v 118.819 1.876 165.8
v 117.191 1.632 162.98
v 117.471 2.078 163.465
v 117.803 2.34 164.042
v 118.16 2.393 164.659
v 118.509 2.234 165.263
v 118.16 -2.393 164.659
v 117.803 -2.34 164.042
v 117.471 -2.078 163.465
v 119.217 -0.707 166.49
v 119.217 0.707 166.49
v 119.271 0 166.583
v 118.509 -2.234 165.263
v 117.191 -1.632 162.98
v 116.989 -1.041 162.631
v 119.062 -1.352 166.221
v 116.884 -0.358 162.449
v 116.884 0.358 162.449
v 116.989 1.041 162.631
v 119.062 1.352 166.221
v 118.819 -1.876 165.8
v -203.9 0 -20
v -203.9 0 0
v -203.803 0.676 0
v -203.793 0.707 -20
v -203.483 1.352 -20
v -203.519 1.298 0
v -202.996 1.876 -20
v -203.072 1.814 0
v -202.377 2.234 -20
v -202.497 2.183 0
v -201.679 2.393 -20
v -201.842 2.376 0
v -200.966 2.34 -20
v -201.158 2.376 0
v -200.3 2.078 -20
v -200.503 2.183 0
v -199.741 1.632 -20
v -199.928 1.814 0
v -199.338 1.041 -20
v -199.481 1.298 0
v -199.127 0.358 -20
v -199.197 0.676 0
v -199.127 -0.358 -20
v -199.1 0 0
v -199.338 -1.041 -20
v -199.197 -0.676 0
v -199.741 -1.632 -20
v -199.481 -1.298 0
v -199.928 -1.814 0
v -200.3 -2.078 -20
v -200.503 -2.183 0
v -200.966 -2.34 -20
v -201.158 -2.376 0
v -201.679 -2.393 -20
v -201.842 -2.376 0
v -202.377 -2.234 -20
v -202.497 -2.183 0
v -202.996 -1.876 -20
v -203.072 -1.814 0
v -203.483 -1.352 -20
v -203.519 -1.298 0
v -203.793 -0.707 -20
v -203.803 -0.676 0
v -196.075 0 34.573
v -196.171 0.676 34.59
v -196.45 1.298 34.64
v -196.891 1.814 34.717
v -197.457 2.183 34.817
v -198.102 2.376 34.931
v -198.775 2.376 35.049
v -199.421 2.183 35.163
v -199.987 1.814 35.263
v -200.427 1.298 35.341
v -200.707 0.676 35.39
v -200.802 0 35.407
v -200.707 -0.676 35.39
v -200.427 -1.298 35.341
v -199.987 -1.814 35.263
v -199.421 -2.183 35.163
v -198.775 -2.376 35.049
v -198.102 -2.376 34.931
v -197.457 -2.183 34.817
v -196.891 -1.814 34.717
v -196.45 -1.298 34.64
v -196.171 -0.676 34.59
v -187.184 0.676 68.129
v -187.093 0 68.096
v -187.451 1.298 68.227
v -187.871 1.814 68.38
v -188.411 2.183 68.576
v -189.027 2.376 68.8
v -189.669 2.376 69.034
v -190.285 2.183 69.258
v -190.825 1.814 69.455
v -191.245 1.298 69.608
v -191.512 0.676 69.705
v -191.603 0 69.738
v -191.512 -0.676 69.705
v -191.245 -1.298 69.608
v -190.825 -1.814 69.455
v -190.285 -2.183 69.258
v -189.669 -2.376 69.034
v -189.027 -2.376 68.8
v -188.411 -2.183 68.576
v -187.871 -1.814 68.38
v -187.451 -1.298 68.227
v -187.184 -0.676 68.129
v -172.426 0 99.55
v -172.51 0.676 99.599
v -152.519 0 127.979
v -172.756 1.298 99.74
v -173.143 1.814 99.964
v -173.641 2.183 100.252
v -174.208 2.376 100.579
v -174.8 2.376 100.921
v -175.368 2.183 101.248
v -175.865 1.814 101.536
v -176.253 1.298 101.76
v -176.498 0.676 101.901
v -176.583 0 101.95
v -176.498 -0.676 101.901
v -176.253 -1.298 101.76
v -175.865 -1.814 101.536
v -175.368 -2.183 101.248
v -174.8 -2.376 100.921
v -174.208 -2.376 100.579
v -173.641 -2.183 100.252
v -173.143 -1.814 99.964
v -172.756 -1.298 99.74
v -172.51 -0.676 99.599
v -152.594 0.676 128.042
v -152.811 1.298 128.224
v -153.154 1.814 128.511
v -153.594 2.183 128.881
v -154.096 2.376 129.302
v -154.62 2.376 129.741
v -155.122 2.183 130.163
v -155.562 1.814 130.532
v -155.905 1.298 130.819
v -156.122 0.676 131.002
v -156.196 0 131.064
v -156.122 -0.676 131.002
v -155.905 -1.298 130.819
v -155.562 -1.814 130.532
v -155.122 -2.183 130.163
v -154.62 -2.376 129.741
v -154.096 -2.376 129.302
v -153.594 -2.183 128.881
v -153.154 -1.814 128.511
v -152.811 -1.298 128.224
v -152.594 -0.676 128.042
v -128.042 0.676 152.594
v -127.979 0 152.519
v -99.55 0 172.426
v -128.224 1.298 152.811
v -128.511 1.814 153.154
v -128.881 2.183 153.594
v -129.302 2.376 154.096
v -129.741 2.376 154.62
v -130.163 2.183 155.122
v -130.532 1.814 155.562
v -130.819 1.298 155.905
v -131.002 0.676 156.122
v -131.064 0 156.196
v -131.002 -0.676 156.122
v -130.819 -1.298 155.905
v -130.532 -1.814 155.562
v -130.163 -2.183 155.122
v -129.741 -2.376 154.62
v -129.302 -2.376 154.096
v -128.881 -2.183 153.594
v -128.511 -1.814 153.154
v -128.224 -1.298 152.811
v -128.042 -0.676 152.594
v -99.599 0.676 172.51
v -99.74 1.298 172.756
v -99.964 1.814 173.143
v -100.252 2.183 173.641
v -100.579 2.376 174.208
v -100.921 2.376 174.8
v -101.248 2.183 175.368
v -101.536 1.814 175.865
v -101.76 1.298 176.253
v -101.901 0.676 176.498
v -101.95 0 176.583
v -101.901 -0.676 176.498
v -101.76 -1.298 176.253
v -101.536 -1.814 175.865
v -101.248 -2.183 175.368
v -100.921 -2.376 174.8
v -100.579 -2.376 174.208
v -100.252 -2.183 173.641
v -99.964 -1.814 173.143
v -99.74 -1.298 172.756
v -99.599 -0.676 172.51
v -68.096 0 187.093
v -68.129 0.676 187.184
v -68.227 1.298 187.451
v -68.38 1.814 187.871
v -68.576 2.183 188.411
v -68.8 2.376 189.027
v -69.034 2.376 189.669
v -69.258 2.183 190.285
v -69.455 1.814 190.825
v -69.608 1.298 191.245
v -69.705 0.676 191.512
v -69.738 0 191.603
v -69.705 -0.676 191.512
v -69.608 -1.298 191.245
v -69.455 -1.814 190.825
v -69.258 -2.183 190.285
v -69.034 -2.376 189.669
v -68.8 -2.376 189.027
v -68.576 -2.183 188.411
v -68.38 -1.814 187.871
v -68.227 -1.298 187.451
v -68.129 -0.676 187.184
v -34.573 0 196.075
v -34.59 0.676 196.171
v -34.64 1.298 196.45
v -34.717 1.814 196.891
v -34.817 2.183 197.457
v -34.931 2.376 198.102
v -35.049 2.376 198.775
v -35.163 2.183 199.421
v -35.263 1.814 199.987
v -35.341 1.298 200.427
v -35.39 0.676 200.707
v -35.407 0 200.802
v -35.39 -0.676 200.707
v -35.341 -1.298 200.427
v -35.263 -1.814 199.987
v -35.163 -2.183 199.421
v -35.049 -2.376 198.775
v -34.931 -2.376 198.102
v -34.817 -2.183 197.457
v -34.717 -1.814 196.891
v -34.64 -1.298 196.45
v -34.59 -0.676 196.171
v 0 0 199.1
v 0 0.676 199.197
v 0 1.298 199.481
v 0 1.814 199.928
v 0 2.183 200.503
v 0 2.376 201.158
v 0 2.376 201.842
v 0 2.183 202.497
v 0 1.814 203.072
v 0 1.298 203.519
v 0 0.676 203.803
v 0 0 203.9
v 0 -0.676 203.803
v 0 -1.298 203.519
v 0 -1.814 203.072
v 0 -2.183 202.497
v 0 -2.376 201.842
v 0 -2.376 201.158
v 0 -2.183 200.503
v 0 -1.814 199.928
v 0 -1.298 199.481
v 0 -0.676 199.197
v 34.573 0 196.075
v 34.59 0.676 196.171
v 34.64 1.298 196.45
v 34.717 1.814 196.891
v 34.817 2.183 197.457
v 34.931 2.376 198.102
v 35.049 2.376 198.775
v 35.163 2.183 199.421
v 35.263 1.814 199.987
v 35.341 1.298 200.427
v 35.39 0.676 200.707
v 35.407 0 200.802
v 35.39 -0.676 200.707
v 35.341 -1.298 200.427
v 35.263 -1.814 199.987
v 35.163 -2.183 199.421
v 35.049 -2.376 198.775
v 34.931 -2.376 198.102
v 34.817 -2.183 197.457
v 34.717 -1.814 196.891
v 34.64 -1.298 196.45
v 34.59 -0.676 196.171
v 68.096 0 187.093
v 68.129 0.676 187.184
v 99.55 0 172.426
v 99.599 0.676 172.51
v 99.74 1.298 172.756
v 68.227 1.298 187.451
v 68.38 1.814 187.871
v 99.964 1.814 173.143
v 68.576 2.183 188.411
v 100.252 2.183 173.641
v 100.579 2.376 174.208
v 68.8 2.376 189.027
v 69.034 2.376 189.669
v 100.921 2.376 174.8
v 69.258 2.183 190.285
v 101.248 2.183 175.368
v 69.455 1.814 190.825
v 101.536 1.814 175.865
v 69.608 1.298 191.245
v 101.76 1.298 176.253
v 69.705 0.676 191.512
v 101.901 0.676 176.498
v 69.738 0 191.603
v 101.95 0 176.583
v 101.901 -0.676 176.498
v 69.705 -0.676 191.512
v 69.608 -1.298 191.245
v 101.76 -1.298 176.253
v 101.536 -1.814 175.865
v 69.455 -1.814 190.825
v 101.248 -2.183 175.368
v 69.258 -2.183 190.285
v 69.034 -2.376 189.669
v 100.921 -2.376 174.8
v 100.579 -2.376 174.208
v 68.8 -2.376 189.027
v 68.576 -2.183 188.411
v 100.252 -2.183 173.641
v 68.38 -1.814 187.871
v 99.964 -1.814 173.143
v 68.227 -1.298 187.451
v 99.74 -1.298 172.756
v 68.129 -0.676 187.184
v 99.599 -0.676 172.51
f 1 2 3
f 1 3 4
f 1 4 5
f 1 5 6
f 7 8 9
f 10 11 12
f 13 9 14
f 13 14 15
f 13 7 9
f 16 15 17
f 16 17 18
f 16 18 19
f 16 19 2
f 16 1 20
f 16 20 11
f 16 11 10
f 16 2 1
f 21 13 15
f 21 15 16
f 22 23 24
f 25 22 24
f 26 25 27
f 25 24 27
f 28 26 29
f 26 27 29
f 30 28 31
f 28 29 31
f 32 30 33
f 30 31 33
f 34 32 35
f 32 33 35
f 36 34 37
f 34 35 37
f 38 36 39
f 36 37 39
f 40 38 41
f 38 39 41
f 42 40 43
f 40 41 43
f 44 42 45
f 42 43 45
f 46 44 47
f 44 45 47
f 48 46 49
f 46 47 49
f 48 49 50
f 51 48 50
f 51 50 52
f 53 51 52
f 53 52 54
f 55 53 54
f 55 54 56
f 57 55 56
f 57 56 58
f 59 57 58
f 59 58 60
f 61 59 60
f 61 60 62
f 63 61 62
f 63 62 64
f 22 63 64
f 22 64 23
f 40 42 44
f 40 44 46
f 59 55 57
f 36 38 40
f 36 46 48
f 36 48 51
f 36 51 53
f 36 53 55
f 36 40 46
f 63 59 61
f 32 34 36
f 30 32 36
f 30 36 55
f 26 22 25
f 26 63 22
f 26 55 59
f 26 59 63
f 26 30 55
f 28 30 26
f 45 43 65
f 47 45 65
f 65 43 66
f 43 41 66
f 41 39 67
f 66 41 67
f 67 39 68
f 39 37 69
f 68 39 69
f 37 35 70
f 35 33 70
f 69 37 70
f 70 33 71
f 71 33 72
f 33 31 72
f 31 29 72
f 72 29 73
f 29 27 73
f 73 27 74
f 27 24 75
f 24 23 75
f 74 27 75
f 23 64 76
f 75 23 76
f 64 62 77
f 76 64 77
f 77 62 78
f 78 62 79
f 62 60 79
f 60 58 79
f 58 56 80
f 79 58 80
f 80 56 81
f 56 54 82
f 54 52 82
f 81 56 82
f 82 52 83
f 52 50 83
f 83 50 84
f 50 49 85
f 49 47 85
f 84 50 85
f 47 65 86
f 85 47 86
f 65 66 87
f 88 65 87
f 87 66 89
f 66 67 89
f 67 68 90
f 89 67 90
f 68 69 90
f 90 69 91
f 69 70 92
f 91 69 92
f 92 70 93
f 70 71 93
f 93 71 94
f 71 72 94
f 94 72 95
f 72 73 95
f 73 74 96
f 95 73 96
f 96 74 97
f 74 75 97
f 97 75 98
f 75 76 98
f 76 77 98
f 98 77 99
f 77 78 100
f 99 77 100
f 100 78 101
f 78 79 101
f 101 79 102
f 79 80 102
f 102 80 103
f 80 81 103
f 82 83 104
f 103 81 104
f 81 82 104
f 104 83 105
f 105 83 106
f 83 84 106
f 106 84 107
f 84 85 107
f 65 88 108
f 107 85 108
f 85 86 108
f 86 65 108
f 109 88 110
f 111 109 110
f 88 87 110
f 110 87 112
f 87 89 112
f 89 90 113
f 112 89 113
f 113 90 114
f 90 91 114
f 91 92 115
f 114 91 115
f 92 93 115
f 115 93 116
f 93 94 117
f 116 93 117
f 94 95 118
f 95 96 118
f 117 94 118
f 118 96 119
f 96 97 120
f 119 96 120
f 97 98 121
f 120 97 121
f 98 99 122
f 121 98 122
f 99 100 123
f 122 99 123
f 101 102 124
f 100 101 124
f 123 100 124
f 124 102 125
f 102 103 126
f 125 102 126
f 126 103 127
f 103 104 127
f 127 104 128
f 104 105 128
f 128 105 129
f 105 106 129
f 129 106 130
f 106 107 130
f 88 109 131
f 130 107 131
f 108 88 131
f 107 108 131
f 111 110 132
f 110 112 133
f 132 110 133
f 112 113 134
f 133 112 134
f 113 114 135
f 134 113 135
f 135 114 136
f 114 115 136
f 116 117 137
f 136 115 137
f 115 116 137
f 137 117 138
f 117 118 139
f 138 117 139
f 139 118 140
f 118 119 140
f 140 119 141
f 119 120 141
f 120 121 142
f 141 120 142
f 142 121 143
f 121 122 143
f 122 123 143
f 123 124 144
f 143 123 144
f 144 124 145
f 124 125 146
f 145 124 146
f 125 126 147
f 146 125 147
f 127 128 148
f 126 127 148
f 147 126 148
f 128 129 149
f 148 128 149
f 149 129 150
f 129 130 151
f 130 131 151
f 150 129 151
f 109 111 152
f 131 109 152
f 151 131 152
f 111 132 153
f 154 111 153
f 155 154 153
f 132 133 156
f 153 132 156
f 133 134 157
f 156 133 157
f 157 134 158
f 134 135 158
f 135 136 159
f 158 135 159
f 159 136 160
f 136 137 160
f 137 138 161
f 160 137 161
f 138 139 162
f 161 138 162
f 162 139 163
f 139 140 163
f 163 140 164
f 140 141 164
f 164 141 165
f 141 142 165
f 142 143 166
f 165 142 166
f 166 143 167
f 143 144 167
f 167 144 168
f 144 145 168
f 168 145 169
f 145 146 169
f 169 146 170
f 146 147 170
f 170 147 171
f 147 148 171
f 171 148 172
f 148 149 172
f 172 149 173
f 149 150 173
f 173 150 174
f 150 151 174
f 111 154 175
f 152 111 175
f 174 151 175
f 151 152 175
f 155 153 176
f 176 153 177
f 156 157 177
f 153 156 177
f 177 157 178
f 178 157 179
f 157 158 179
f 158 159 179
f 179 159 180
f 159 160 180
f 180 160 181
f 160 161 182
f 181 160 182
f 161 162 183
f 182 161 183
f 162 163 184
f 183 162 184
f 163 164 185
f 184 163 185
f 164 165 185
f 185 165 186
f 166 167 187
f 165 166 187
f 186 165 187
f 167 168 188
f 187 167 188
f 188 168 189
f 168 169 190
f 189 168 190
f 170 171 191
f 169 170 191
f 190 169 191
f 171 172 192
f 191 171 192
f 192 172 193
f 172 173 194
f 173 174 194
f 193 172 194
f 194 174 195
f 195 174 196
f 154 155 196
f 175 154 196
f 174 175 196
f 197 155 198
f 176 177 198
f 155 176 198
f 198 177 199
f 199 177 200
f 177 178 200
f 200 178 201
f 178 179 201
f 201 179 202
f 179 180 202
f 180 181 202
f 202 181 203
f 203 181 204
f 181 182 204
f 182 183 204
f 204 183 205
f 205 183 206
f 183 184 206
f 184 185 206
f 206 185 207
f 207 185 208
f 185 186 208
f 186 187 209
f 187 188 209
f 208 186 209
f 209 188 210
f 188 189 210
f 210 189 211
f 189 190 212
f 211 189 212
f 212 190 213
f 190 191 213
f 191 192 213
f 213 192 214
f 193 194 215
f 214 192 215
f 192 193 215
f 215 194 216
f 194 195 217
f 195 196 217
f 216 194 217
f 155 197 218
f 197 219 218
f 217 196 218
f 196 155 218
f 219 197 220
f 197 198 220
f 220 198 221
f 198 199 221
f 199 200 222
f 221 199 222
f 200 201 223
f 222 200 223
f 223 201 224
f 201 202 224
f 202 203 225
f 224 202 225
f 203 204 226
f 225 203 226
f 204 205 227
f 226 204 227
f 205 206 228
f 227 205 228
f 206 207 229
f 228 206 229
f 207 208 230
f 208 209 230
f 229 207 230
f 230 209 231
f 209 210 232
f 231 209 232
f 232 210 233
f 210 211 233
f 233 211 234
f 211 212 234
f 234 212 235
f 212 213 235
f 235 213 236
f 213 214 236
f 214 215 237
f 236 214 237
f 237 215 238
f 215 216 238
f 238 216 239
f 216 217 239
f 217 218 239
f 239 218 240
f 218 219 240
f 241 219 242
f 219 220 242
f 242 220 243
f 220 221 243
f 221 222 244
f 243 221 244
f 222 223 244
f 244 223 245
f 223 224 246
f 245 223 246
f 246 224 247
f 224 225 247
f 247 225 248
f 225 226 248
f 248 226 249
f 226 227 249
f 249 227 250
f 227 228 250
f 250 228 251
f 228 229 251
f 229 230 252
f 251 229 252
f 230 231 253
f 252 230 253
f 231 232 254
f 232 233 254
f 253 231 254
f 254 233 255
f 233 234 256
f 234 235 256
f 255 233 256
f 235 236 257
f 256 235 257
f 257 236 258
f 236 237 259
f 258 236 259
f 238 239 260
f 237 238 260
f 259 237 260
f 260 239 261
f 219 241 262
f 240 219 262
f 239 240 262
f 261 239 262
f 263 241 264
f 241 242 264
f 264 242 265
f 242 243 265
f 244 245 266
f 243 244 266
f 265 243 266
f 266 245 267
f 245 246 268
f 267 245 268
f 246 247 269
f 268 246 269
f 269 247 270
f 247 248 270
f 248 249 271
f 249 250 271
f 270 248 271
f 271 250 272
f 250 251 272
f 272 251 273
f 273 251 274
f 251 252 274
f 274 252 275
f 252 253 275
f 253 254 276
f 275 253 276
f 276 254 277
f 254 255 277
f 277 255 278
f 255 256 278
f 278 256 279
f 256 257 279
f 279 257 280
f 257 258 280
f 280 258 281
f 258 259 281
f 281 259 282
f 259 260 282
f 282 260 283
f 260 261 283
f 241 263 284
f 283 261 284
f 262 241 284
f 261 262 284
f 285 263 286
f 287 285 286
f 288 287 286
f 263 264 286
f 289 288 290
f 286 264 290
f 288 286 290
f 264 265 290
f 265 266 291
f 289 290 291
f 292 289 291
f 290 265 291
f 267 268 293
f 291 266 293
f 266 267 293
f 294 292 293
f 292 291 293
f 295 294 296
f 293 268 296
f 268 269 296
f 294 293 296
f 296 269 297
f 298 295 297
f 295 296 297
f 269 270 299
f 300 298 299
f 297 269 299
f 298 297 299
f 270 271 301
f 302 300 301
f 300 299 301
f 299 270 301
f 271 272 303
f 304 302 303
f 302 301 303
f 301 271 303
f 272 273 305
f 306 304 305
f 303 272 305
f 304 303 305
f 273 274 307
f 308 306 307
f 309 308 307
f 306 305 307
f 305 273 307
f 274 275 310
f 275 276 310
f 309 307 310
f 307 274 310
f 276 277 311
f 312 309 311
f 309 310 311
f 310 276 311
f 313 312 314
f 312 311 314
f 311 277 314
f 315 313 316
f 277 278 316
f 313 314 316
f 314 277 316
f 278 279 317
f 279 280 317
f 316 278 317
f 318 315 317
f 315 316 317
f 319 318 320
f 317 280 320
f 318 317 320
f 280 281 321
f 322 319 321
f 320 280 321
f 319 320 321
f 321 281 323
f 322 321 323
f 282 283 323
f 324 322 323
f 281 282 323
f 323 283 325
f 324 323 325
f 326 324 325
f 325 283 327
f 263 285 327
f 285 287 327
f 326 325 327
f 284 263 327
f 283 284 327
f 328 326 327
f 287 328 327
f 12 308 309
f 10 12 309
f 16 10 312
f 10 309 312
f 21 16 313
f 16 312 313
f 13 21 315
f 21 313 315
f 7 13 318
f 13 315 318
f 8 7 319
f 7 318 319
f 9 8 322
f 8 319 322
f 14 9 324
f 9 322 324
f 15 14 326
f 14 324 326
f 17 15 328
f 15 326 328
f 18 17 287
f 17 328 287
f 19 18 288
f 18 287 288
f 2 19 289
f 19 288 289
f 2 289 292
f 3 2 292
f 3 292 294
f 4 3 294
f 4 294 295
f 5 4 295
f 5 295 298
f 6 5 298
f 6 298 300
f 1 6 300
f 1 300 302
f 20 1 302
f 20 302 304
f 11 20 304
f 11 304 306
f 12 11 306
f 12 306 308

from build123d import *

# Parameters (mm, degrees)
SKETCH3_R           = 2.4
REVOLVE1_ANGLE      = 120
SKETCH4_R           = 2.4
BOSS_EXTRUDE1_DEPTH = 20
SKETCH5_R           = 2.4
BOSS_EXTRUDE2_DEPTH = 20


with BuildPart() as part:
    # Sketch3 → Revolve1 (revolve)
    with BuildSketch(Plane.XY):
        with Locations((-201.5, 0)):
            Circle(SKETCH3_R)
    revolve(axis=Axis((0, 0, 0), (0, 1, 0)), revolution_arc=REVOLVE1_ANGLE)

    # Sketch4 → Boss-Extrude1 (add)
    with BuildSketch(Plane(origin=(0, 0, 0), x_dir=(-0.5000000000000043, 0, -0.8660254037844363), z_dir=(0.8660254037844362, 0, -0.5000000000000042))):
        with Locations(Location((-201.5, 0, 0), (0, 0, 180))):
            Circle(SKETCH4_R)
    extrude(amount=BOSS_EXTRUDE1_DEPTH)

    # Sketch5 → Boss-Extrude2 (add)
    with BuildSketch(Plane(origin=(0, 0, 0), x_dir=(-1, 0, 0), z_dir=(0, 0, -1))):
        with Locations((201.5, 0)):
            Circle(SKETCH5_R)
    extrude(amount=BOSS_EXTRUDE2_DEPTH)


solid = part.part
